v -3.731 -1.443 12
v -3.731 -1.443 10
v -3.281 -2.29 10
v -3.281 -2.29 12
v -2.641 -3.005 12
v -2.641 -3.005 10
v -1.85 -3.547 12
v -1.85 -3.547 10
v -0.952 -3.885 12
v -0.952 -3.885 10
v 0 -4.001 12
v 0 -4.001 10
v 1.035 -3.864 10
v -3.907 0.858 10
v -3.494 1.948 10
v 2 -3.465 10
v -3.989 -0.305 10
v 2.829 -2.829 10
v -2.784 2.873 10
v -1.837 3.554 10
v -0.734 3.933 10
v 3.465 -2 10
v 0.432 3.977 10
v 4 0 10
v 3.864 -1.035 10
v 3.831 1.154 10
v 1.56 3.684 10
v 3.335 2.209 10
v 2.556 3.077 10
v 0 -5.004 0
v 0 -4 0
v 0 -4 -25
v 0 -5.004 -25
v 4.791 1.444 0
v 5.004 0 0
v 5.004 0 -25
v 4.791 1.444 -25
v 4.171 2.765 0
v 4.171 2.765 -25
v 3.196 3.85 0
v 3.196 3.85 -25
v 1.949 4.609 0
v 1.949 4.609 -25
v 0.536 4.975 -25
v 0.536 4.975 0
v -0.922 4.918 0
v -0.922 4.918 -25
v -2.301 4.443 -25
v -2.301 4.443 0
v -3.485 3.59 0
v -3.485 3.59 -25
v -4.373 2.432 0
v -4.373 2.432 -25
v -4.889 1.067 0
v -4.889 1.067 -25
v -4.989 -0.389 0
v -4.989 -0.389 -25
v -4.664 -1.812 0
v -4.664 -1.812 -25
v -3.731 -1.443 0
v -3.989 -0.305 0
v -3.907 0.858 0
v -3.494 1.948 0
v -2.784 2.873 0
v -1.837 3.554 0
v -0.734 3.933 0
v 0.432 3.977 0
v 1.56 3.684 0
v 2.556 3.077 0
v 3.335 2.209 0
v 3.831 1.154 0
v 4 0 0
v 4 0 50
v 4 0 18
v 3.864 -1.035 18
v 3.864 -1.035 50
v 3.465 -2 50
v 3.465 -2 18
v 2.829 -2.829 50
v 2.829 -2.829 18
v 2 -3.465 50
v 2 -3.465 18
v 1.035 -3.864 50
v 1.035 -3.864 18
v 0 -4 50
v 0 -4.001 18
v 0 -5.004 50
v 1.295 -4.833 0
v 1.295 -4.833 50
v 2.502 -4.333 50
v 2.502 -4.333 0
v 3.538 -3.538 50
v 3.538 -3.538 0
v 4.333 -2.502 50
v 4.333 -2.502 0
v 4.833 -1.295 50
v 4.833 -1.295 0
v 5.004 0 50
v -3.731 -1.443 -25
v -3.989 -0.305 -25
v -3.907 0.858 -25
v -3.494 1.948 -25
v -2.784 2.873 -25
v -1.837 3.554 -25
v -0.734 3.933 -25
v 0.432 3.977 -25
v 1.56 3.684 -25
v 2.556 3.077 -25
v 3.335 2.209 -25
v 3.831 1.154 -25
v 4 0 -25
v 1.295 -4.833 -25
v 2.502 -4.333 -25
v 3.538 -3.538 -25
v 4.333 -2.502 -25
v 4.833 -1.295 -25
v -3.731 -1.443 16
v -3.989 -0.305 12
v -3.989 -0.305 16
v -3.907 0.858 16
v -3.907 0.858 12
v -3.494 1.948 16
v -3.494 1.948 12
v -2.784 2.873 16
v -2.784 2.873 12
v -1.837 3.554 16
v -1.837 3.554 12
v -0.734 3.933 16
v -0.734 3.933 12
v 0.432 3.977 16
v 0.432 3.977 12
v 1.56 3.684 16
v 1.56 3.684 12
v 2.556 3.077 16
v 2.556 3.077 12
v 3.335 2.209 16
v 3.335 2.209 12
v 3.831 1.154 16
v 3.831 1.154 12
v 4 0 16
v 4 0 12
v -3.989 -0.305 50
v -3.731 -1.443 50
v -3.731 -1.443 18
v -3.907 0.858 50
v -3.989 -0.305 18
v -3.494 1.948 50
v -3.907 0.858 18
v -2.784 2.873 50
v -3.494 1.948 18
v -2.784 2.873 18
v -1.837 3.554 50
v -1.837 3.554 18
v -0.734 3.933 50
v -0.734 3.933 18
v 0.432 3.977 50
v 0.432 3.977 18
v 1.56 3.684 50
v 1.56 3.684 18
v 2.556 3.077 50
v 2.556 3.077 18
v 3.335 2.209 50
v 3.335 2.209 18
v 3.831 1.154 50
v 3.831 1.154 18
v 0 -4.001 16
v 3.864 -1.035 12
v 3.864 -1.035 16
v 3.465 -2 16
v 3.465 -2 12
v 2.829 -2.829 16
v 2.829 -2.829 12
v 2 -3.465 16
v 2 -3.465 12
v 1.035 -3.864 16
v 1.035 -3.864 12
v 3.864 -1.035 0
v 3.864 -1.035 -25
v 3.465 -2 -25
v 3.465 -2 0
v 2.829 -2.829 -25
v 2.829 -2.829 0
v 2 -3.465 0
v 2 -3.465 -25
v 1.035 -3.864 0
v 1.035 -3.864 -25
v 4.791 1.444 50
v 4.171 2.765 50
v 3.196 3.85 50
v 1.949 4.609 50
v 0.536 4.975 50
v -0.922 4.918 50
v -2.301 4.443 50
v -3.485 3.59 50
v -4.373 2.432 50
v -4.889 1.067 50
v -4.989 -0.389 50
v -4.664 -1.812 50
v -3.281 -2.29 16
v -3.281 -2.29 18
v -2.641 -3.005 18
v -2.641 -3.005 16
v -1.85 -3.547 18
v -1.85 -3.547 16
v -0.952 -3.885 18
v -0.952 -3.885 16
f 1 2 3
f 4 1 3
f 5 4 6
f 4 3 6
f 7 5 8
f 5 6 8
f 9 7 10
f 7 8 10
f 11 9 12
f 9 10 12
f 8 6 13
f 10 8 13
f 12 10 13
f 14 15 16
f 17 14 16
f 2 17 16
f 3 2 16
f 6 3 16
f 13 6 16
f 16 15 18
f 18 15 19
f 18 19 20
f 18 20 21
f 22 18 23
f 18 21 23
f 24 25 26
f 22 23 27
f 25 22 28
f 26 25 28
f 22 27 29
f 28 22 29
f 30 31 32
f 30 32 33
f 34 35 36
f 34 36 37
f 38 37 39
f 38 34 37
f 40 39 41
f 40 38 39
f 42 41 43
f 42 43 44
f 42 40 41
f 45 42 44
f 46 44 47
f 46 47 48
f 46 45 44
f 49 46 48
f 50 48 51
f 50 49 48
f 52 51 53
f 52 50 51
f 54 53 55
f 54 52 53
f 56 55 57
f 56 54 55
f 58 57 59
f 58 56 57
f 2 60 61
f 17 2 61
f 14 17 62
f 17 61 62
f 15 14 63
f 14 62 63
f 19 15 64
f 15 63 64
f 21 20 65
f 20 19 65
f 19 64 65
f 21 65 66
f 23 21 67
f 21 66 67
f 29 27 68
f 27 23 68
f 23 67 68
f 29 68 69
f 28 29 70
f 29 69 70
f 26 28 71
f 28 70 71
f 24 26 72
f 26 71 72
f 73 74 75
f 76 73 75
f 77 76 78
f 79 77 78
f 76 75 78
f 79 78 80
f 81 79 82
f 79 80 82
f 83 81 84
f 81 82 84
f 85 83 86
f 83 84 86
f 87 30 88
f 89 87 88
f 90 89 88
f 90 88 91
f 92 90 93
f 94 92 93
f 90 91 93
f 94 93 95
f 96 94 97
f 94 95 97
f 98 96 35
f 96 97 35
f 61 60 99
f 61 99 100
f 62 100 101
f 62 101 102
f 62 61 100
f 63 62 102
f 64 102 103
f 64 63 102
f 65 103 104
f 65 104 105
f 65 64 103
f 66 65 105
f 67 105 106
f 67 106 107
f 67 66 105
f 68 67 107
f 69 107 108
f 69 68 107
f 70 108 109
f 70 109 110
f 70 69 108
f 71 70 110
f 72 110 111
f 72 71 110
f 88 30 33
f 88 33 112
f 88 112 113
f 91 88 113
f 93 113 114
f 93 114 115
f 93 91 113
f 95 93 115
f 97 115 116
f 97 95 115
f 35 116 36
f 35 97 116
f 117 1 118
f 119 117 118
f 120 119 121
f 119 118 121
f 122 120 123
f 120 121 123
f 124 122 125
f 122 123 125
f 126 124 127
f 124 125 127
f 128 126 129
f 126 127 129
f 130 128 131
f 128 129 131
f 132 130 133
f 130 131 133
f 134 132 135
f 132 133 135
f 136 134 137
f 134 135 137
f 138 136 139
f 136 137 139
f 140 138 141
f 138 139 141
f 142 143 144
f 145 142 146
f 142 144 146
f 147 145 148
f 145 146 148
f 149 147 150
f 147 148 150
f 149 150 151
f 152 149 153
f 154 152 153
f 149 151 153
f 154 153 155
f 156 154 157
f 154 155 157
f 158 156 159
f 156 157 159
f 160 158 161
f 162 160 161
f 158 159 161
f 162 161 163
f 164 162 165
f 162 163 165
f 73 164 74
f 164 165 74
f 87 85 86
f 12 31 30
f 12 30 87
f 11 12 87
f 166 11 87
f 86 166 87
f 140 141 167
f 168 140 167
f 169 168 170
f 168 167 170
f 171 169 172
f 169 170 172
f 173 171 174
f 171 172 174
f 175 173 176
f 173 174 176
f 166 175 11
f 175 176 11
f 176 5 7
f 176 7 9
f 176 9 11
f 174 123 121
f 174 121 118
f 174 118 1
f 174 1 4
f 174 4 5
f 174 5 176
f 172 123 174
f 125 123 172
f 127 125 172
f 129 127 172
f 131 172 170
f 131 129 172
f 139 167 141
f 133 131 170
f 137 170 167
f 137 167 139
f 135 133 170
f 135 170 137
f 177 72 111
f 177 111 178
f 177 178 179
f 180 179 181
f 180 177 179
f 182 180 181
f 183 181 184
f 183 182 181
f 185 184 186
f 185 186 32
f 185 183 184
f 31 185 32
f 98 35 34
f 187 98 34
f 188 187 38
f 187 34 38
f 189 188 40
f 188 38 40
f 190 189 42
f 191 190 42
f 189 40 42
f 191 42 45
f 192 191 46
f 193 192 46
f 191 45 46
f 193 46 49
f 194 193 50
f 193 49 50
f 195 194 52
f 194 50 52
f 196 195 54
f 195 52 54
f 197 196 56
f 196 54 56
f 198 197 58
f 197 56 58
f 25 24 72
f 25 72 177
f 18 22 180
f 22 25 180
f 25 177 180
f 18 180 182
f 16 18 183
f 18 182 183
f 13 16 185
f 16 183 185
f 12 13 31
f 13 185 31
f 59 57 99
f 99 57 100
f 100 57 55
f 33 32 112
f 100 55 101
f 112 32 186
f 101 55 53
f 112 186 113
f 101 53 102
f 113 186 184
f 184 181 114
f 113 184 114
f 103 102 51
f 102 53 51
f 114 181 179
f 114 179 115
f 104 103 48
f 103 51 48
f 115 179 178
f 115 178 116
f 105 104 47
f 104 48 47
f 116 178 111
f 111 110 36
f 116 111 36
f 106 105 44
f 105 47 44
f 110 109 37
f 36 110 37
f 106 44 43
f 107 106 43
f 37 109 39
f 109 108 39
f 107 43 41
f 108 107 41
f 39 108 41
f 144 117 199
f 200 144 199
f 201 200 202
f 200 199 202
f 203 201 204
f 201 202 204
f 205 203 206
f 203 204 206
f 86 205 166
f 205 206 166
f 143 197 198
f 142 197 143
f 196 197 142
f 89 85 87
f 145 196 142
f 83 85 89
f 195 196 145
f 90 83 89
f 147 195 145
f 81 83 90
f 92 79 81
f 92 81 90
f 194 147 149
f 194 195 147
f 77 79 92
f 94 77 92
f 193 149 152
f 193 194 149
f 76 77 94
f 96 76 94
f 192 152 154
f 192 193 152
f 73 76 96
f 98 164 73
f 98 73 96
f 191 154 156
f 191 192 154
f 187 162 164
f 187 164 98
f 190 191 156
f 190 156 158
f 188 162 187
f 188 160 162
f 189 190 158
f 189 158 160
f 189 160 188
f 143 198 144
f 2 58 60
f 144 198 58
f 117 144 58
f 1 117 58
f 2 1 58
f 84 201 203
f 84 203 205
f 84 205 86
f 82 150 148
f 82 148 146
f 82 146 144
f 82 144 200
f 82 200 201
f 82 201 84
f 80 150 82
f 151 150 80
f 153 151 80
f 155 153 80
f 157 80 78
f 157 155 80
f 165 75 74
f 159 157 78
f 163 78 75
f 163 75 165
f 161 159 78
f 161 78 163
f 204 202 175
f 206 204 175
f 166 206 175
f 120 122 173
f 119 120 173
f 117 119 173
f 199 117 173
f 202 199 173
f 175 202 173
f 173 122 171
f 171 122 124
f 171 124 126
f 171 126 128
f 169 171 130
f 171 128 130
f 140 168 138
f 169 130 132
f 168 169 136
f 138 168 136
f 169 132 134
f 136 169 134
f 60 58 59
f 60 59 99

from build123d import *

# Parameters (mm, degrees)
F1_DEPTH = 50
F2_START = 16
F2_DEPTH = 2
F3_START = 10
F3_DEPTH = 2
F4_DEPTH = 25


with BuildPart() as f1:
    # F0 (on Top) → F1 (new body)
    with BuildSketch(Plane.XY):
        with BuildLine():
            ThreePointArc((-3.7313016861, -1.4427016245), (-0.7338010135, 3.9326246099), (4.0005, 0))
            ThreePointArc((4.0005, 0), (2.8287806781, -2.8287806781), (0, -4.0005))
            Line((0, -4.0005), (0, -5.0038))
            ThreePointArc((0, -5.0038), (3.5382209117, -3.5382209117), (5.0038, 0))
            ThreePointArc((5.0038, 0), (-0.9216629242, 4.9181858336), (-4.6642730222, -1.8117868569))
            Line((-4.6642730222, -1.8117868569), (-3.7313016861, -1.4427016245))
        make_face()
    extrude(amount=F1_DEPTH)

    # F0 (on Top) → F2 (join)
    with BuildSketch(Plane.XY.offset(F2_START)):
        with BuildLine():
            ThreePointArc((0, -4.0005), (2.8287806781, -2.8287806781), (4.0005, 0))
            ThreePointArc((4.0005, 0), (-0.7338010135, 3.9326246099), (-3.7313016861, -1.4427016245))
            ThreePointArc((-3.7313016861, -1.4427016245), (-2.2619098569, -3.2996612022), (0, -4.0005))
        make_face()
    extrude(amount=F2_DEPTH)

    # F0 (on Top) → F3 (join)
    with BuildSketch(Plane.XY.offset(F3_START)):
        with BuildLine():
            ThreePointArc((0, -4.0005), (2.8287806781, -2.8287806781), (4.0005, 0))
            ThreePointArc((4.0005, 0), (-0.7338010135, 3.9326246099), (-3.7313016861, -1.4427016245))
            ThreePointArc((-3.7313016861, -1.4427016245), (-2.2619098569, -3.2996612022), (0, -4.0005))
        make_face()
    extrude(amount=F3_DEPTH)

    # F0 (on Top) → F4 (join)
    with BuildSketch(Plane.XY):
        with BuildLine():
            ThreePointArc((-3.7313016861, -1.4427016245), (-0.7338010135, 3.9326246099), (4.0005, 0))
            ThreePointArc((4.0005, 0), (2.8287806781, -2.8287806781), (0, -4.0005))
            Line((0, -4.0005), (0, -5.0038))
            ThreePointArc((0, -5.0038), (3.5382209117, -3.5382209117), (5.0038, 0))
            ThreePointArc((5.0038, 0), (-0.9216629242, 4.9181858336), (-4.6642730222, -1.8117868569))
            Line((-4.6642730222, -1.8117868569), (-3.7313016861, -1.4427016245))
        make_face()
    extrude(amount=-F4_DEPTH)


solid = f1.part
